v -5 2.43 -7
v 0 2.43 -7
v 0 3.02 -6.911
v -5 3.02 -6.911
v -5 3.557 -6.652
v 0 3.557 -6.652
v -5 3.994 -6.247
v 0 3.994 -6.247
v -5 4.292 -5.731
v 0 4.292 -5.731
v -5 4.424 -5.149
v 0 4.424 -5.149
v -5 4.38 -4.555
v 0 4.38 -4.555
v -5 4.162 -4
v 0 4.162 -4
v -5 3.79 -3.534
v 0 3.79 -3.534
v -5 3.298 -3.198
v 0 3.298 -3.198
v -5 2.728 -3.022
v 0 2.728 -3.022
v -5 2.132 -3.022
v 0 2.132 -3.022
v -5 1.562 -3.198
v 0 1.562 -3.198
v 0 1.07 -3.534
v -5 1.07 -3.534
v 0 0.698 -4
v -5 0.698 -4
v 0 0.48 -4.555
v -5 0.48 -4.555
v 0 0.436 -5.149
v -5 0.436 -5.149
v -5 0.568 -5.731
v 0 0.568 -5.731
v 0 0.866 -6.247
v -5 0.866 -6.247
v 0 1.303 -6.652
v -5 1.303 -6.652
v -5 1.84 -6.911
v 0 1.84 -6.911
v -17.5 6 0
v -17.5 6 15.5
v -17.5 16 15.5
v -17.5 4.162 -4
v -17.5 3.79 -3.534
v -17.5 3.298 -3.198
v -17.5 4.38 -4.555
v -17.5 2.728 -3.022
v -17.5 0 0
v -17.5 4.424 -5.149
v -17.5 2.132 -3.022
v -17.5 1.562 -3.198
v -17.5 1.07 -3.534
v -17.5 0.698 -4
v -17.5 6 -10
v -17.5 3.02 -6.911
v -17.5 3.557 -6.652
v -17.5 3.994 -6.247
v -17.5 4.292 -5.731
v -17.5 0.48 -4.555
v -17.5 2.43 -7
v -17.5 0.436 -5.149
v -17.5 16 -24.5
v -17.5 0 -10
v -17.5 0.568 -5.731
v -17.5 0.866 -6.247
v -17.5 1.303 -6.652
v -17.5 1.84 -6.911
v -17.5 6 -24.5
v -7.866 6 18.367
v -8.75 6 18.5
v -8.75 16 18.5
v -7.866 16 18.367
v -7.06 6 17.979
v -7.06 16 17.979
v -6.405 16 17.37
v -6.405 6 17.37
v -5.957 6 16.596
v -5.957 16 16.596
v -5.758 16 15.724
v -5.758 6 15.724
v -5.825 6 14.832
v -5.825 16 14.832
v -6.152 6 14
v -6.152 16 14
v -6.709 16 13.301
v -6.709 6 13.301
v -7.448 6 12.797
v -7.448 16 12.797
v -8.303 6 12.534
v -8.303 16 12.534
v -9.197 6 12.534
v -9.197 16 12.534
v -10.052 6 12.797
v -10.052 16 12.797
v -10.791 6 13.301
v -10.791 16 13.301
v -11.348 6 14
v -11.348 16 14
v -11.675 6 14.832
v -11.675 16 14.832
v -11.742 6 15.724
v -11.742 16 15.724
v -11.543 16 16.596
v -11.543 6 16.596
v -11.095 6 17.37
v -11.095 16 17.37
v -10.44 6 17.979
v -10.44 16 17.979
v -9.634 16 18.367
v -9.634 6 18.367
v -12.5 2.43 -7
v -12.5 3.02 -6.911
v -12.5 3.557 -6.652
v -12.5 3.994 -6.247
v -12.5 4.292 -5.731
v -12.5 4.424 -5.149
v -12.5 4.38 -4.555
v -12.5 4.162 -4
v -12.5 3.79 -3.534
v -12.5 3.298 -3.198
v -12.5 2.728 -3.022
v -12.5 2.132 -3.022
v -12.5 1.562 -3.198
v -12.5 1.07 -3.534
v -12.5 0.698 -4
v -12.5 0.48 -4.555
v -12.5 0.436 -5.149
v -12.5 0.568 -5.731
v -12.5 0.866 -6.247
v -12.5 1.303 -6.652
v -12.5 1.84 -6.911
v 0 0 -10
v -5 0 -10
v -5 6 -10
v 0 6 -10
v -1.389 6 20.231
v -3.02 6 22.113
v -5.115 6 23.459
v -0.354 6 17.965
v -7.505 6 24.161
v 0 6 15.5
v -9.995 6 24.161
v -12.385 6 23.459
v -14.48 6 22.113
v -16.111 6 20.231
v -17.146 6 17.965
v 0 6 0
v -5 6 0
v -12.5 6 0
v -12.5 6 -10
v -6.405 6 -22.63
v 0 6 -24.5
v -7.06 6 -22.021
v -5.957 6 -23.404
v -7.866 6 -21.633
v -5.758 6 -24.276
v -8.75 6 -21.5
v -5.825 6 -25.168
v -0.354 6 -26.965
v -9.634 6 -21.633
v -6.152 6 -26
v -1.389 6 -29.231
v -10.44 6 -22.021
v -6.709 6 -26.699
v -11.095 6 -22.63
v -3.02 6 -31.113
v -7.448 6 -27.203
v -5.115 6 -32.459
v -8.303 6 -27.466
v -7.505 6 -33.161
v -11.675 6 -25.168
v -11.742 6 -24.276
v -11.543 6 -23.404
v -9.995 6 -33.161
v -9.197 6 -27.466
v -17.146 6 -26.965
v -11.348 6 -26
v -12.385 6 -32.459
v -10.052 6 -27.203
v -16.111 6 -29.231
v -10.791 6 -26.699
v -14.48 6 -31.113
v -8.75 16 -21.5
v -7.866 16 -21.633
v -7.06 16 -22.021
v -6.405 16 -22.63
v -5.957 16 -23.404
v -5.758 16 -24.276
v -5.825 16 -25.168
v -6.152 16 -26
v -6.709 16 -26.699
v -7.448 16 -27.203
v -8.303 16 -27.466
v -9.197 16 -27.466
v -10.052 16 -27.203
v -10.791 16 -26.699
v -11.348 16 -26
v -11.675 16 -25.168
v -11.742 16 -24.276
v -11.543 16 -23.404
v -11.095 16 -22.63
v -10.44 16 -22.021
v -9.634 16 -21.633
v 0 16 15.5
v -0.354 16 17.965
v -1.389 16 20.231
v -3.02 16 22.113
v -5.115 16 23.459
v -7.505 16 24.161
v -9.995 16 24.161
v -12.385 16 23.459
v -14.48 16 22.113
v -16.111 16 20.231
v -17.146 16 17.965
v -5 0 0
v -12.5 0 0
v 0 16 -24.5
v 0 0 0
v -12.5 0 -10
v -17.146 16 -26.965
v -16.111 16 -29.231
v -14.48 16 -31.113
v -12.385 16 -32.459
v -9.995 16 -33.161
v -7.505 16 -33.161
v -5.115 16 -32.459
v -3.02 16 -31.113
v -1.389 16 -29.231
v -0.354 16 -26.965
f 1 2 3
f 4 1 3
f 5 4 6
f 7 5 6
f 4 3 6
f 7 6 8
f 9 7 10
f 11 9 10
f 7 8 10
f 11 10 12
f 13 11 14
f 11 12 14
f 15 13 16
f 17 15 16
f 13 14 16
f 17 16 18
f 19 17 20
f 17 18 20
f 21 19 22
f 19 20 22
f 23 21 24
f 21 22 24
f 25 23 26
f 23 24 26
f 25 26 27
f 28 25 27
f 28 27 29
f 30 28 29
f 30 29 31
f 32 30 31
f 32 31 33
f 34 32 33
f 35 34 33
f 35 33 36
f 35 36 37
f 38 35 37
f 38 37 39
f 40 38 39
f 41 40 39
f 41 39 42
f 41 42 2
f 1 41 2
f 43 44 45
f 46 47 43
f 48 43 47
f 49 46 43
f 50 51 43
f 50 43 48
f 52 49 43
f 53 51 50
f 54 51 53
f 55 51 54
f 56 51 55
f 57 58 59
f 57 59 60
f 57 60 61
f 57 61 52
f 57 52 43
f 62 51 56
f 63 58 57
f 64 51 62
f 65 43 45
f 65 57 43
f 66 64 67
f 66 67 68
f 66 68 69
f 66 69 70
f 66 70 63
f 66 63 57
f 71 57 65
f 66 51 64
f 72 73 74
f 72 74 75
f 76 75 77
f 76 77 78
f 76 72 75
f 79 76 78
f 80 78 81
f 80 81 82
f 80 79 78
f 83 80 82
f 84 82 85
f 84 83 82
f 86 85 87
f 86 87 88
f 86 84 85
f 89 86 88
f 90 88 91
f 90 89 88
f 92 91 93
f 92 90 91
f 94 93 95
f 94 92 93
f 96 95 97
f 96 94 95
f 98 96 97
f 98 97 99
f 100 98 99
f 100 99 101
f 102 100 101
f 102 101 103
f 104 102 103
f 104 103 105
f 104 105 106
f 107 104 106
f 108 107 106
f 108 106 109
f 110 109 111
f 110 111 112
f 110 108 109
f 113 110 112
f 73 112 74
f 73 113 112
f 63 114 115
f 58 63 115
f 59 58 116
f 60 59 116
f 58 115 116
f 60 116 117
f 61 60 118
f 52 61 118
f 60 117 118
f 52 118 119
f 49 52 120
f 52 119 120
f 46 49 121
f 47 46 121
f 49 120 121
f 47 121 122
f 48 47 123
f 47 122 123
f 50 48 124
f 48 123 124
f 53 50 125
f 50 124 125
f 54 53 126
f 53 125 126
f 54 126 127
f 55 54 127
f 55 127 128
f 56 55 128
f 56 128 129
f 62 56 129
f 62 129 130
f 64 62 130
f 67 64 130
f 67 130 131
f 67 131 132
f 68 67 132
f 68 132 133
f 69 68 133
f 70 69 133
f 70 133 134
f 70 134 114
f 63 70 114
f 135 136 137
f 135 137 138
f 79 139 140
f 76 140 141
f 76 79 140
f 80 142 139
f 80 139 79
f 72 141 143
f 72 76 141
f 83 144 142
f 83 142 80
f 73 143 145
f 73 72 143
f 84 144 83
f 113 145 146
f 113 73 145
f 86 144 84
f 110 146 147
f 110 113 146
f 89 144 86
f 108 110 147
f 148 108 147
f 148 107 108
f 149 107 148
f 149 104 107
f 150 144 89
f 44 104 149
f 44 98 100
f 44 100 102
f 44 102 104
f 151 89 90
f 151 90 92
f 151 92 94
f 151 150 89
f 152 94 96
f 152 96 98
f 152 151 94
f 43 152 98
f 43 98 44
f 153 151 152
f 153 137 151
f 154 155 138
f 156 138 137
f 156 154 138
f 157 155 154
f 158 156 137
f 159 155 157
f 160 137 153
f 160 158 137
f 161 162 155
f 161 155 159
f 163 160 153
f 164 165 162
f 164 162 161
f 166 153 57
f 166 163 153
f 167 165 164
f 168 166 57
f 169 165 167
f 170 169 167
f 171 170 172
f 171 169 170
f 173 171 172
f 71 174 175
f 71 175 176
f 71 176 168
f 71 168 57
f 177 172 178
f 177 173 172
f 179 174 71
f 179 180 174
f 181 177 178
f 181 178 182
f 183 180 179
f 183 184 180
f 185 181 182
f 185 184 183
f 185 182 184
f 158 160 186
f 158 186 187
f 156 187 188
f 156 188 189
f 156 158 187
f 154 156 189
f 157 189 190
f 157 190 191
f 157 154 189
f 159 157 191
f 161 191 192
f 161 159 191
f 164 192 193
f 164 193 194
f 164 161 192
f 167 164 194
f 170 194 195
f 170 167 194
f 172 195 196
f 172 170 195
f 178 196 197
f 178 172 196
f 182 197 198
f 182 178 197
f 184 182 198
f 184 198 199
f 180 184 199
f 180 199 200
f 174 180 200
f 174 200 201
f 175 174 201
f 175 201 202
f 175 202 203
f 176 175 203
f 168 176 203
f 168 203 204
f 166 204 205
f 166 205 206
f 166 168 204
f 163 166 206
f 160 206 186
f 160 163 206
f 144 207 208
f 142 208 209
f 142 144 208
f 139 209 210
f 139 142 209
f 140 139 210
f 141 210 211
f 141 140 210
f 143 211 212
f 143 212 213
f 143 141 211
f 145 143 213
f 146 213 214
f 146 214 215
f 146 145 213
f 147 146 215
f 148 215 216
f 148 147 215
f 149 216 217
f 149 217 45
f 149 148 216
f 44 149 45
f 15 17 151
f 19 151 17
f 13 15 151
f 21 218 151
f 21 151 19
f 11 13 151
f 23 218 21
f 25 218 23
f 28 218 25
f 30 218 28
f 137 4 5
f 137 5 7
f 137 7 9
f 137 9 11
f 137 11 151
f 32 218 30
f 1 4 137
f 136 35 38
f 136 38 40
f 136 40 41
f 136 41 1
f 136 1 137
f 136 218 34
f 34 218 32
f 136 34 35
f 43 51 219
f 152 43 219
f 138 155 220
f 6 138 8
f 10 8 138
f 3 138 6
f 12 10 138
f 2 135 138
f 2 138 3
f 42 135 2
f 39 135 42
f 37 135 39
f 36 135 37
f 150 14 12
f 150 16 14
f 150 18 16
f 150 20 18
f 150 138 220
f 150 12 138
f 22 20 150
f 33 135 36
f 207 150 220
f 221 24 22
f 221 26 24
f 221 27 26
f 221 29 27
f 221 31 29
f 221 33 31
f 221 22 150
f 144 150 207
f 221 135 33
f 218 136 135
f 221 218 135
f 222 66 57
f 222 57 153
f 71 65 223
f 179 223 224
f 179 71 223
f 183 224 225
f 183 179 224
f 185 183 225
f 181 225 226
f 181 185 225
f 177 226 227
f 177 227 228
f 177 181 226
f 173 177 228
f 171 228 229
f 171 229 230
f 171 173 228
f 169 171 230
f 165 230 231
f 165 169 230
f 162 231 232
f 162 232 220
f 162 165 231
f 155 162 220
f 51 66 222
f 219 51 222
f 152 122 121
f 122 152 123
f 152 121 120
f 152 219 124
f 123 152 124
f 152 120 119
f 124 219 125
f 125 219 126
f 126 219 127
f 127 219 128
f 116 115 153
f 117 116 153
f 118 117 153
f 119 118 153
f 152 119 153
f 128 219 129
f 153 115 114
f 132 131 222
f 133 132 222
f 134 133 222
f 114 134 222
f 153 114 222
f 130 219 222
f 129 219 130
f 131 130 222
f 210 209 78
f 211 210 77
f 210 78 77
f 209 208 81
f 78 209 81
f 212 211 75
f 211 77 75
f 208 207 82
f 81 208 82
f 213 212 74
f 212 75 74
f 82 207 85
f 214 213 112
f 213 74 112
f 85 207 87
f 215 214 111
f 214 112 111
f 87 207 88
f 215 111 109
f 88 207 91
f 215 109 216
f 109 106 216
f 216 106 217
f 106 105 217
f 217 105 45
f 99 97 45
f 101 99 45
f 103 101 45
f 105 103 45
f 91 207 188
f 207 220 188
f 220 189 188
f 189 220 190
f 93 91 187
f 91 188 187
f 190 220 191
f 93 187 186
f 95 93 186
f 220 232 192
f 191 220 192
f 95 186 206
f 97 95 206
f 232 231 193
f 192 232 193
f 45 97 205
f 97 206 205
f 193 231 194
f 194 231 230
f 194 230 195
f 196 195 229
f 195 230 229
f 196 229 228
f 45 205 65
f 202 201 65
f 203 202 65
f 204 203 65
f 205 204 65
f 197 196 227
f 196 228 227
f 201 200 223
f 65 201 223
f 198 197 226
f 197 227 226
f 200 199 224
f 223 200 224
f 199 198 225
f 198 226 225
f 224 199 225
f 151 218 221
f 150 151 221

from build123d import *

# Parameters (mm, degrees)
SKETCH1_W             = 5
SKETCH1_H             = 10
BOSS_EXTRUDE1_DEPTH   = 6
BOSS_EXTRUDE1_2_DEPTH = 6
SKETCH2_R             = 2
CUT_EXTRUDE1_DEPTH    = 100
SKETCH4_R             = 3
BOSS_EXTRUDE2_DEPTH   = 10


with BuildPart() as part:
    # Sketch1 → Boss-Extrude1 (new body)
    with BuildSketch(Plane(origin=(0, 0, 0), x_dir=(1, 0, 0), z_dir=(0, 1, 0))):
        with Locations((-15, 5)):
            Rectangle(SKETCH1_W, SKETCH1_H)
    extrude(amount=BOSS_EXTRUDE1_DEPTH)


with BuildPart() as body_2:
    # Sketch1 → Boss-Extrude1 2 (new body)
    with BuildSketch(Plane(origin=(0, 0, 0), x_dir=(1, 0, 0), z_dir=(0, 1, 0))):
        with Locations((-2.5, 5)):
            Rectangle(SKETCH1_W, SKETCH1_H)
    extrude(amount=BOSS_EXTRUDE1_2_DEPTH)


with BuildPart() as cut_extrude1_tool:
    # Sketch2 → Cut-Extrude1 (new body)
    with BuildSketch(Plane(origin=(0, 0, 0), x_dir=(0, 0, -1), z_dir=(1, 0, 0))):
        with Locations((5, 2.43)):
            Circle(SKETCH2_R)
    extrude(amount=-CUT_EXTRUDE1_DEPTH)


with BuildPart() as part_1:
    add(part.part)

    # Cut-Extrude1: cut by cut_extrude1_tool
    add(cut_extrude1_tool.part, mode=Mode.SUBTRACT)



with BuildPart() as body_2_1:
    add(body_2.part)

    # Cut-Extrude1: cut by cut_extrude1_tool
    add(cut_extrude1_tool.part, mode=Mode.SUBTRACT)


with BuildPart() as part_2:
    add(part_1.part)

    add(body_2_1.part)  # Boss-Extrude2 merges body 2
    # Sketch4 → Boss-Extrude2 (add)
    with BuildSketch(Plane(origin=(0, 6, 0), x_dir=(1, 0, 0), z_dir=(0, 1, 0))):
        with BuildLine():
            Line((-17.5, -15.5), (-17.5, 24.5))
            ThreePointArc((-17.5, 24.5), (-8.75, 33.25), (0, 24.5))
            Line((0, 24.5), (0, -15.5))
            ThreePointArc((0, -15.5), (-8.75, -24.25), (-17.5, -15.5))
        make_face()
        with Locations(Location((-8.75, 24.5, 0), (0, 0, 270))):
            Circle(SKETCH4_R, mode=Mode.SUBTRACT)
        with Locations(Location((-8.75, -15.5, 0), (0, 0, 270))):
            Circle(SKETCH4_R, mode=Mode.SUBTRACT)
    extrude(amount=BOSS_EXTRUDE2_DEPTH)


solid = part_2.part
